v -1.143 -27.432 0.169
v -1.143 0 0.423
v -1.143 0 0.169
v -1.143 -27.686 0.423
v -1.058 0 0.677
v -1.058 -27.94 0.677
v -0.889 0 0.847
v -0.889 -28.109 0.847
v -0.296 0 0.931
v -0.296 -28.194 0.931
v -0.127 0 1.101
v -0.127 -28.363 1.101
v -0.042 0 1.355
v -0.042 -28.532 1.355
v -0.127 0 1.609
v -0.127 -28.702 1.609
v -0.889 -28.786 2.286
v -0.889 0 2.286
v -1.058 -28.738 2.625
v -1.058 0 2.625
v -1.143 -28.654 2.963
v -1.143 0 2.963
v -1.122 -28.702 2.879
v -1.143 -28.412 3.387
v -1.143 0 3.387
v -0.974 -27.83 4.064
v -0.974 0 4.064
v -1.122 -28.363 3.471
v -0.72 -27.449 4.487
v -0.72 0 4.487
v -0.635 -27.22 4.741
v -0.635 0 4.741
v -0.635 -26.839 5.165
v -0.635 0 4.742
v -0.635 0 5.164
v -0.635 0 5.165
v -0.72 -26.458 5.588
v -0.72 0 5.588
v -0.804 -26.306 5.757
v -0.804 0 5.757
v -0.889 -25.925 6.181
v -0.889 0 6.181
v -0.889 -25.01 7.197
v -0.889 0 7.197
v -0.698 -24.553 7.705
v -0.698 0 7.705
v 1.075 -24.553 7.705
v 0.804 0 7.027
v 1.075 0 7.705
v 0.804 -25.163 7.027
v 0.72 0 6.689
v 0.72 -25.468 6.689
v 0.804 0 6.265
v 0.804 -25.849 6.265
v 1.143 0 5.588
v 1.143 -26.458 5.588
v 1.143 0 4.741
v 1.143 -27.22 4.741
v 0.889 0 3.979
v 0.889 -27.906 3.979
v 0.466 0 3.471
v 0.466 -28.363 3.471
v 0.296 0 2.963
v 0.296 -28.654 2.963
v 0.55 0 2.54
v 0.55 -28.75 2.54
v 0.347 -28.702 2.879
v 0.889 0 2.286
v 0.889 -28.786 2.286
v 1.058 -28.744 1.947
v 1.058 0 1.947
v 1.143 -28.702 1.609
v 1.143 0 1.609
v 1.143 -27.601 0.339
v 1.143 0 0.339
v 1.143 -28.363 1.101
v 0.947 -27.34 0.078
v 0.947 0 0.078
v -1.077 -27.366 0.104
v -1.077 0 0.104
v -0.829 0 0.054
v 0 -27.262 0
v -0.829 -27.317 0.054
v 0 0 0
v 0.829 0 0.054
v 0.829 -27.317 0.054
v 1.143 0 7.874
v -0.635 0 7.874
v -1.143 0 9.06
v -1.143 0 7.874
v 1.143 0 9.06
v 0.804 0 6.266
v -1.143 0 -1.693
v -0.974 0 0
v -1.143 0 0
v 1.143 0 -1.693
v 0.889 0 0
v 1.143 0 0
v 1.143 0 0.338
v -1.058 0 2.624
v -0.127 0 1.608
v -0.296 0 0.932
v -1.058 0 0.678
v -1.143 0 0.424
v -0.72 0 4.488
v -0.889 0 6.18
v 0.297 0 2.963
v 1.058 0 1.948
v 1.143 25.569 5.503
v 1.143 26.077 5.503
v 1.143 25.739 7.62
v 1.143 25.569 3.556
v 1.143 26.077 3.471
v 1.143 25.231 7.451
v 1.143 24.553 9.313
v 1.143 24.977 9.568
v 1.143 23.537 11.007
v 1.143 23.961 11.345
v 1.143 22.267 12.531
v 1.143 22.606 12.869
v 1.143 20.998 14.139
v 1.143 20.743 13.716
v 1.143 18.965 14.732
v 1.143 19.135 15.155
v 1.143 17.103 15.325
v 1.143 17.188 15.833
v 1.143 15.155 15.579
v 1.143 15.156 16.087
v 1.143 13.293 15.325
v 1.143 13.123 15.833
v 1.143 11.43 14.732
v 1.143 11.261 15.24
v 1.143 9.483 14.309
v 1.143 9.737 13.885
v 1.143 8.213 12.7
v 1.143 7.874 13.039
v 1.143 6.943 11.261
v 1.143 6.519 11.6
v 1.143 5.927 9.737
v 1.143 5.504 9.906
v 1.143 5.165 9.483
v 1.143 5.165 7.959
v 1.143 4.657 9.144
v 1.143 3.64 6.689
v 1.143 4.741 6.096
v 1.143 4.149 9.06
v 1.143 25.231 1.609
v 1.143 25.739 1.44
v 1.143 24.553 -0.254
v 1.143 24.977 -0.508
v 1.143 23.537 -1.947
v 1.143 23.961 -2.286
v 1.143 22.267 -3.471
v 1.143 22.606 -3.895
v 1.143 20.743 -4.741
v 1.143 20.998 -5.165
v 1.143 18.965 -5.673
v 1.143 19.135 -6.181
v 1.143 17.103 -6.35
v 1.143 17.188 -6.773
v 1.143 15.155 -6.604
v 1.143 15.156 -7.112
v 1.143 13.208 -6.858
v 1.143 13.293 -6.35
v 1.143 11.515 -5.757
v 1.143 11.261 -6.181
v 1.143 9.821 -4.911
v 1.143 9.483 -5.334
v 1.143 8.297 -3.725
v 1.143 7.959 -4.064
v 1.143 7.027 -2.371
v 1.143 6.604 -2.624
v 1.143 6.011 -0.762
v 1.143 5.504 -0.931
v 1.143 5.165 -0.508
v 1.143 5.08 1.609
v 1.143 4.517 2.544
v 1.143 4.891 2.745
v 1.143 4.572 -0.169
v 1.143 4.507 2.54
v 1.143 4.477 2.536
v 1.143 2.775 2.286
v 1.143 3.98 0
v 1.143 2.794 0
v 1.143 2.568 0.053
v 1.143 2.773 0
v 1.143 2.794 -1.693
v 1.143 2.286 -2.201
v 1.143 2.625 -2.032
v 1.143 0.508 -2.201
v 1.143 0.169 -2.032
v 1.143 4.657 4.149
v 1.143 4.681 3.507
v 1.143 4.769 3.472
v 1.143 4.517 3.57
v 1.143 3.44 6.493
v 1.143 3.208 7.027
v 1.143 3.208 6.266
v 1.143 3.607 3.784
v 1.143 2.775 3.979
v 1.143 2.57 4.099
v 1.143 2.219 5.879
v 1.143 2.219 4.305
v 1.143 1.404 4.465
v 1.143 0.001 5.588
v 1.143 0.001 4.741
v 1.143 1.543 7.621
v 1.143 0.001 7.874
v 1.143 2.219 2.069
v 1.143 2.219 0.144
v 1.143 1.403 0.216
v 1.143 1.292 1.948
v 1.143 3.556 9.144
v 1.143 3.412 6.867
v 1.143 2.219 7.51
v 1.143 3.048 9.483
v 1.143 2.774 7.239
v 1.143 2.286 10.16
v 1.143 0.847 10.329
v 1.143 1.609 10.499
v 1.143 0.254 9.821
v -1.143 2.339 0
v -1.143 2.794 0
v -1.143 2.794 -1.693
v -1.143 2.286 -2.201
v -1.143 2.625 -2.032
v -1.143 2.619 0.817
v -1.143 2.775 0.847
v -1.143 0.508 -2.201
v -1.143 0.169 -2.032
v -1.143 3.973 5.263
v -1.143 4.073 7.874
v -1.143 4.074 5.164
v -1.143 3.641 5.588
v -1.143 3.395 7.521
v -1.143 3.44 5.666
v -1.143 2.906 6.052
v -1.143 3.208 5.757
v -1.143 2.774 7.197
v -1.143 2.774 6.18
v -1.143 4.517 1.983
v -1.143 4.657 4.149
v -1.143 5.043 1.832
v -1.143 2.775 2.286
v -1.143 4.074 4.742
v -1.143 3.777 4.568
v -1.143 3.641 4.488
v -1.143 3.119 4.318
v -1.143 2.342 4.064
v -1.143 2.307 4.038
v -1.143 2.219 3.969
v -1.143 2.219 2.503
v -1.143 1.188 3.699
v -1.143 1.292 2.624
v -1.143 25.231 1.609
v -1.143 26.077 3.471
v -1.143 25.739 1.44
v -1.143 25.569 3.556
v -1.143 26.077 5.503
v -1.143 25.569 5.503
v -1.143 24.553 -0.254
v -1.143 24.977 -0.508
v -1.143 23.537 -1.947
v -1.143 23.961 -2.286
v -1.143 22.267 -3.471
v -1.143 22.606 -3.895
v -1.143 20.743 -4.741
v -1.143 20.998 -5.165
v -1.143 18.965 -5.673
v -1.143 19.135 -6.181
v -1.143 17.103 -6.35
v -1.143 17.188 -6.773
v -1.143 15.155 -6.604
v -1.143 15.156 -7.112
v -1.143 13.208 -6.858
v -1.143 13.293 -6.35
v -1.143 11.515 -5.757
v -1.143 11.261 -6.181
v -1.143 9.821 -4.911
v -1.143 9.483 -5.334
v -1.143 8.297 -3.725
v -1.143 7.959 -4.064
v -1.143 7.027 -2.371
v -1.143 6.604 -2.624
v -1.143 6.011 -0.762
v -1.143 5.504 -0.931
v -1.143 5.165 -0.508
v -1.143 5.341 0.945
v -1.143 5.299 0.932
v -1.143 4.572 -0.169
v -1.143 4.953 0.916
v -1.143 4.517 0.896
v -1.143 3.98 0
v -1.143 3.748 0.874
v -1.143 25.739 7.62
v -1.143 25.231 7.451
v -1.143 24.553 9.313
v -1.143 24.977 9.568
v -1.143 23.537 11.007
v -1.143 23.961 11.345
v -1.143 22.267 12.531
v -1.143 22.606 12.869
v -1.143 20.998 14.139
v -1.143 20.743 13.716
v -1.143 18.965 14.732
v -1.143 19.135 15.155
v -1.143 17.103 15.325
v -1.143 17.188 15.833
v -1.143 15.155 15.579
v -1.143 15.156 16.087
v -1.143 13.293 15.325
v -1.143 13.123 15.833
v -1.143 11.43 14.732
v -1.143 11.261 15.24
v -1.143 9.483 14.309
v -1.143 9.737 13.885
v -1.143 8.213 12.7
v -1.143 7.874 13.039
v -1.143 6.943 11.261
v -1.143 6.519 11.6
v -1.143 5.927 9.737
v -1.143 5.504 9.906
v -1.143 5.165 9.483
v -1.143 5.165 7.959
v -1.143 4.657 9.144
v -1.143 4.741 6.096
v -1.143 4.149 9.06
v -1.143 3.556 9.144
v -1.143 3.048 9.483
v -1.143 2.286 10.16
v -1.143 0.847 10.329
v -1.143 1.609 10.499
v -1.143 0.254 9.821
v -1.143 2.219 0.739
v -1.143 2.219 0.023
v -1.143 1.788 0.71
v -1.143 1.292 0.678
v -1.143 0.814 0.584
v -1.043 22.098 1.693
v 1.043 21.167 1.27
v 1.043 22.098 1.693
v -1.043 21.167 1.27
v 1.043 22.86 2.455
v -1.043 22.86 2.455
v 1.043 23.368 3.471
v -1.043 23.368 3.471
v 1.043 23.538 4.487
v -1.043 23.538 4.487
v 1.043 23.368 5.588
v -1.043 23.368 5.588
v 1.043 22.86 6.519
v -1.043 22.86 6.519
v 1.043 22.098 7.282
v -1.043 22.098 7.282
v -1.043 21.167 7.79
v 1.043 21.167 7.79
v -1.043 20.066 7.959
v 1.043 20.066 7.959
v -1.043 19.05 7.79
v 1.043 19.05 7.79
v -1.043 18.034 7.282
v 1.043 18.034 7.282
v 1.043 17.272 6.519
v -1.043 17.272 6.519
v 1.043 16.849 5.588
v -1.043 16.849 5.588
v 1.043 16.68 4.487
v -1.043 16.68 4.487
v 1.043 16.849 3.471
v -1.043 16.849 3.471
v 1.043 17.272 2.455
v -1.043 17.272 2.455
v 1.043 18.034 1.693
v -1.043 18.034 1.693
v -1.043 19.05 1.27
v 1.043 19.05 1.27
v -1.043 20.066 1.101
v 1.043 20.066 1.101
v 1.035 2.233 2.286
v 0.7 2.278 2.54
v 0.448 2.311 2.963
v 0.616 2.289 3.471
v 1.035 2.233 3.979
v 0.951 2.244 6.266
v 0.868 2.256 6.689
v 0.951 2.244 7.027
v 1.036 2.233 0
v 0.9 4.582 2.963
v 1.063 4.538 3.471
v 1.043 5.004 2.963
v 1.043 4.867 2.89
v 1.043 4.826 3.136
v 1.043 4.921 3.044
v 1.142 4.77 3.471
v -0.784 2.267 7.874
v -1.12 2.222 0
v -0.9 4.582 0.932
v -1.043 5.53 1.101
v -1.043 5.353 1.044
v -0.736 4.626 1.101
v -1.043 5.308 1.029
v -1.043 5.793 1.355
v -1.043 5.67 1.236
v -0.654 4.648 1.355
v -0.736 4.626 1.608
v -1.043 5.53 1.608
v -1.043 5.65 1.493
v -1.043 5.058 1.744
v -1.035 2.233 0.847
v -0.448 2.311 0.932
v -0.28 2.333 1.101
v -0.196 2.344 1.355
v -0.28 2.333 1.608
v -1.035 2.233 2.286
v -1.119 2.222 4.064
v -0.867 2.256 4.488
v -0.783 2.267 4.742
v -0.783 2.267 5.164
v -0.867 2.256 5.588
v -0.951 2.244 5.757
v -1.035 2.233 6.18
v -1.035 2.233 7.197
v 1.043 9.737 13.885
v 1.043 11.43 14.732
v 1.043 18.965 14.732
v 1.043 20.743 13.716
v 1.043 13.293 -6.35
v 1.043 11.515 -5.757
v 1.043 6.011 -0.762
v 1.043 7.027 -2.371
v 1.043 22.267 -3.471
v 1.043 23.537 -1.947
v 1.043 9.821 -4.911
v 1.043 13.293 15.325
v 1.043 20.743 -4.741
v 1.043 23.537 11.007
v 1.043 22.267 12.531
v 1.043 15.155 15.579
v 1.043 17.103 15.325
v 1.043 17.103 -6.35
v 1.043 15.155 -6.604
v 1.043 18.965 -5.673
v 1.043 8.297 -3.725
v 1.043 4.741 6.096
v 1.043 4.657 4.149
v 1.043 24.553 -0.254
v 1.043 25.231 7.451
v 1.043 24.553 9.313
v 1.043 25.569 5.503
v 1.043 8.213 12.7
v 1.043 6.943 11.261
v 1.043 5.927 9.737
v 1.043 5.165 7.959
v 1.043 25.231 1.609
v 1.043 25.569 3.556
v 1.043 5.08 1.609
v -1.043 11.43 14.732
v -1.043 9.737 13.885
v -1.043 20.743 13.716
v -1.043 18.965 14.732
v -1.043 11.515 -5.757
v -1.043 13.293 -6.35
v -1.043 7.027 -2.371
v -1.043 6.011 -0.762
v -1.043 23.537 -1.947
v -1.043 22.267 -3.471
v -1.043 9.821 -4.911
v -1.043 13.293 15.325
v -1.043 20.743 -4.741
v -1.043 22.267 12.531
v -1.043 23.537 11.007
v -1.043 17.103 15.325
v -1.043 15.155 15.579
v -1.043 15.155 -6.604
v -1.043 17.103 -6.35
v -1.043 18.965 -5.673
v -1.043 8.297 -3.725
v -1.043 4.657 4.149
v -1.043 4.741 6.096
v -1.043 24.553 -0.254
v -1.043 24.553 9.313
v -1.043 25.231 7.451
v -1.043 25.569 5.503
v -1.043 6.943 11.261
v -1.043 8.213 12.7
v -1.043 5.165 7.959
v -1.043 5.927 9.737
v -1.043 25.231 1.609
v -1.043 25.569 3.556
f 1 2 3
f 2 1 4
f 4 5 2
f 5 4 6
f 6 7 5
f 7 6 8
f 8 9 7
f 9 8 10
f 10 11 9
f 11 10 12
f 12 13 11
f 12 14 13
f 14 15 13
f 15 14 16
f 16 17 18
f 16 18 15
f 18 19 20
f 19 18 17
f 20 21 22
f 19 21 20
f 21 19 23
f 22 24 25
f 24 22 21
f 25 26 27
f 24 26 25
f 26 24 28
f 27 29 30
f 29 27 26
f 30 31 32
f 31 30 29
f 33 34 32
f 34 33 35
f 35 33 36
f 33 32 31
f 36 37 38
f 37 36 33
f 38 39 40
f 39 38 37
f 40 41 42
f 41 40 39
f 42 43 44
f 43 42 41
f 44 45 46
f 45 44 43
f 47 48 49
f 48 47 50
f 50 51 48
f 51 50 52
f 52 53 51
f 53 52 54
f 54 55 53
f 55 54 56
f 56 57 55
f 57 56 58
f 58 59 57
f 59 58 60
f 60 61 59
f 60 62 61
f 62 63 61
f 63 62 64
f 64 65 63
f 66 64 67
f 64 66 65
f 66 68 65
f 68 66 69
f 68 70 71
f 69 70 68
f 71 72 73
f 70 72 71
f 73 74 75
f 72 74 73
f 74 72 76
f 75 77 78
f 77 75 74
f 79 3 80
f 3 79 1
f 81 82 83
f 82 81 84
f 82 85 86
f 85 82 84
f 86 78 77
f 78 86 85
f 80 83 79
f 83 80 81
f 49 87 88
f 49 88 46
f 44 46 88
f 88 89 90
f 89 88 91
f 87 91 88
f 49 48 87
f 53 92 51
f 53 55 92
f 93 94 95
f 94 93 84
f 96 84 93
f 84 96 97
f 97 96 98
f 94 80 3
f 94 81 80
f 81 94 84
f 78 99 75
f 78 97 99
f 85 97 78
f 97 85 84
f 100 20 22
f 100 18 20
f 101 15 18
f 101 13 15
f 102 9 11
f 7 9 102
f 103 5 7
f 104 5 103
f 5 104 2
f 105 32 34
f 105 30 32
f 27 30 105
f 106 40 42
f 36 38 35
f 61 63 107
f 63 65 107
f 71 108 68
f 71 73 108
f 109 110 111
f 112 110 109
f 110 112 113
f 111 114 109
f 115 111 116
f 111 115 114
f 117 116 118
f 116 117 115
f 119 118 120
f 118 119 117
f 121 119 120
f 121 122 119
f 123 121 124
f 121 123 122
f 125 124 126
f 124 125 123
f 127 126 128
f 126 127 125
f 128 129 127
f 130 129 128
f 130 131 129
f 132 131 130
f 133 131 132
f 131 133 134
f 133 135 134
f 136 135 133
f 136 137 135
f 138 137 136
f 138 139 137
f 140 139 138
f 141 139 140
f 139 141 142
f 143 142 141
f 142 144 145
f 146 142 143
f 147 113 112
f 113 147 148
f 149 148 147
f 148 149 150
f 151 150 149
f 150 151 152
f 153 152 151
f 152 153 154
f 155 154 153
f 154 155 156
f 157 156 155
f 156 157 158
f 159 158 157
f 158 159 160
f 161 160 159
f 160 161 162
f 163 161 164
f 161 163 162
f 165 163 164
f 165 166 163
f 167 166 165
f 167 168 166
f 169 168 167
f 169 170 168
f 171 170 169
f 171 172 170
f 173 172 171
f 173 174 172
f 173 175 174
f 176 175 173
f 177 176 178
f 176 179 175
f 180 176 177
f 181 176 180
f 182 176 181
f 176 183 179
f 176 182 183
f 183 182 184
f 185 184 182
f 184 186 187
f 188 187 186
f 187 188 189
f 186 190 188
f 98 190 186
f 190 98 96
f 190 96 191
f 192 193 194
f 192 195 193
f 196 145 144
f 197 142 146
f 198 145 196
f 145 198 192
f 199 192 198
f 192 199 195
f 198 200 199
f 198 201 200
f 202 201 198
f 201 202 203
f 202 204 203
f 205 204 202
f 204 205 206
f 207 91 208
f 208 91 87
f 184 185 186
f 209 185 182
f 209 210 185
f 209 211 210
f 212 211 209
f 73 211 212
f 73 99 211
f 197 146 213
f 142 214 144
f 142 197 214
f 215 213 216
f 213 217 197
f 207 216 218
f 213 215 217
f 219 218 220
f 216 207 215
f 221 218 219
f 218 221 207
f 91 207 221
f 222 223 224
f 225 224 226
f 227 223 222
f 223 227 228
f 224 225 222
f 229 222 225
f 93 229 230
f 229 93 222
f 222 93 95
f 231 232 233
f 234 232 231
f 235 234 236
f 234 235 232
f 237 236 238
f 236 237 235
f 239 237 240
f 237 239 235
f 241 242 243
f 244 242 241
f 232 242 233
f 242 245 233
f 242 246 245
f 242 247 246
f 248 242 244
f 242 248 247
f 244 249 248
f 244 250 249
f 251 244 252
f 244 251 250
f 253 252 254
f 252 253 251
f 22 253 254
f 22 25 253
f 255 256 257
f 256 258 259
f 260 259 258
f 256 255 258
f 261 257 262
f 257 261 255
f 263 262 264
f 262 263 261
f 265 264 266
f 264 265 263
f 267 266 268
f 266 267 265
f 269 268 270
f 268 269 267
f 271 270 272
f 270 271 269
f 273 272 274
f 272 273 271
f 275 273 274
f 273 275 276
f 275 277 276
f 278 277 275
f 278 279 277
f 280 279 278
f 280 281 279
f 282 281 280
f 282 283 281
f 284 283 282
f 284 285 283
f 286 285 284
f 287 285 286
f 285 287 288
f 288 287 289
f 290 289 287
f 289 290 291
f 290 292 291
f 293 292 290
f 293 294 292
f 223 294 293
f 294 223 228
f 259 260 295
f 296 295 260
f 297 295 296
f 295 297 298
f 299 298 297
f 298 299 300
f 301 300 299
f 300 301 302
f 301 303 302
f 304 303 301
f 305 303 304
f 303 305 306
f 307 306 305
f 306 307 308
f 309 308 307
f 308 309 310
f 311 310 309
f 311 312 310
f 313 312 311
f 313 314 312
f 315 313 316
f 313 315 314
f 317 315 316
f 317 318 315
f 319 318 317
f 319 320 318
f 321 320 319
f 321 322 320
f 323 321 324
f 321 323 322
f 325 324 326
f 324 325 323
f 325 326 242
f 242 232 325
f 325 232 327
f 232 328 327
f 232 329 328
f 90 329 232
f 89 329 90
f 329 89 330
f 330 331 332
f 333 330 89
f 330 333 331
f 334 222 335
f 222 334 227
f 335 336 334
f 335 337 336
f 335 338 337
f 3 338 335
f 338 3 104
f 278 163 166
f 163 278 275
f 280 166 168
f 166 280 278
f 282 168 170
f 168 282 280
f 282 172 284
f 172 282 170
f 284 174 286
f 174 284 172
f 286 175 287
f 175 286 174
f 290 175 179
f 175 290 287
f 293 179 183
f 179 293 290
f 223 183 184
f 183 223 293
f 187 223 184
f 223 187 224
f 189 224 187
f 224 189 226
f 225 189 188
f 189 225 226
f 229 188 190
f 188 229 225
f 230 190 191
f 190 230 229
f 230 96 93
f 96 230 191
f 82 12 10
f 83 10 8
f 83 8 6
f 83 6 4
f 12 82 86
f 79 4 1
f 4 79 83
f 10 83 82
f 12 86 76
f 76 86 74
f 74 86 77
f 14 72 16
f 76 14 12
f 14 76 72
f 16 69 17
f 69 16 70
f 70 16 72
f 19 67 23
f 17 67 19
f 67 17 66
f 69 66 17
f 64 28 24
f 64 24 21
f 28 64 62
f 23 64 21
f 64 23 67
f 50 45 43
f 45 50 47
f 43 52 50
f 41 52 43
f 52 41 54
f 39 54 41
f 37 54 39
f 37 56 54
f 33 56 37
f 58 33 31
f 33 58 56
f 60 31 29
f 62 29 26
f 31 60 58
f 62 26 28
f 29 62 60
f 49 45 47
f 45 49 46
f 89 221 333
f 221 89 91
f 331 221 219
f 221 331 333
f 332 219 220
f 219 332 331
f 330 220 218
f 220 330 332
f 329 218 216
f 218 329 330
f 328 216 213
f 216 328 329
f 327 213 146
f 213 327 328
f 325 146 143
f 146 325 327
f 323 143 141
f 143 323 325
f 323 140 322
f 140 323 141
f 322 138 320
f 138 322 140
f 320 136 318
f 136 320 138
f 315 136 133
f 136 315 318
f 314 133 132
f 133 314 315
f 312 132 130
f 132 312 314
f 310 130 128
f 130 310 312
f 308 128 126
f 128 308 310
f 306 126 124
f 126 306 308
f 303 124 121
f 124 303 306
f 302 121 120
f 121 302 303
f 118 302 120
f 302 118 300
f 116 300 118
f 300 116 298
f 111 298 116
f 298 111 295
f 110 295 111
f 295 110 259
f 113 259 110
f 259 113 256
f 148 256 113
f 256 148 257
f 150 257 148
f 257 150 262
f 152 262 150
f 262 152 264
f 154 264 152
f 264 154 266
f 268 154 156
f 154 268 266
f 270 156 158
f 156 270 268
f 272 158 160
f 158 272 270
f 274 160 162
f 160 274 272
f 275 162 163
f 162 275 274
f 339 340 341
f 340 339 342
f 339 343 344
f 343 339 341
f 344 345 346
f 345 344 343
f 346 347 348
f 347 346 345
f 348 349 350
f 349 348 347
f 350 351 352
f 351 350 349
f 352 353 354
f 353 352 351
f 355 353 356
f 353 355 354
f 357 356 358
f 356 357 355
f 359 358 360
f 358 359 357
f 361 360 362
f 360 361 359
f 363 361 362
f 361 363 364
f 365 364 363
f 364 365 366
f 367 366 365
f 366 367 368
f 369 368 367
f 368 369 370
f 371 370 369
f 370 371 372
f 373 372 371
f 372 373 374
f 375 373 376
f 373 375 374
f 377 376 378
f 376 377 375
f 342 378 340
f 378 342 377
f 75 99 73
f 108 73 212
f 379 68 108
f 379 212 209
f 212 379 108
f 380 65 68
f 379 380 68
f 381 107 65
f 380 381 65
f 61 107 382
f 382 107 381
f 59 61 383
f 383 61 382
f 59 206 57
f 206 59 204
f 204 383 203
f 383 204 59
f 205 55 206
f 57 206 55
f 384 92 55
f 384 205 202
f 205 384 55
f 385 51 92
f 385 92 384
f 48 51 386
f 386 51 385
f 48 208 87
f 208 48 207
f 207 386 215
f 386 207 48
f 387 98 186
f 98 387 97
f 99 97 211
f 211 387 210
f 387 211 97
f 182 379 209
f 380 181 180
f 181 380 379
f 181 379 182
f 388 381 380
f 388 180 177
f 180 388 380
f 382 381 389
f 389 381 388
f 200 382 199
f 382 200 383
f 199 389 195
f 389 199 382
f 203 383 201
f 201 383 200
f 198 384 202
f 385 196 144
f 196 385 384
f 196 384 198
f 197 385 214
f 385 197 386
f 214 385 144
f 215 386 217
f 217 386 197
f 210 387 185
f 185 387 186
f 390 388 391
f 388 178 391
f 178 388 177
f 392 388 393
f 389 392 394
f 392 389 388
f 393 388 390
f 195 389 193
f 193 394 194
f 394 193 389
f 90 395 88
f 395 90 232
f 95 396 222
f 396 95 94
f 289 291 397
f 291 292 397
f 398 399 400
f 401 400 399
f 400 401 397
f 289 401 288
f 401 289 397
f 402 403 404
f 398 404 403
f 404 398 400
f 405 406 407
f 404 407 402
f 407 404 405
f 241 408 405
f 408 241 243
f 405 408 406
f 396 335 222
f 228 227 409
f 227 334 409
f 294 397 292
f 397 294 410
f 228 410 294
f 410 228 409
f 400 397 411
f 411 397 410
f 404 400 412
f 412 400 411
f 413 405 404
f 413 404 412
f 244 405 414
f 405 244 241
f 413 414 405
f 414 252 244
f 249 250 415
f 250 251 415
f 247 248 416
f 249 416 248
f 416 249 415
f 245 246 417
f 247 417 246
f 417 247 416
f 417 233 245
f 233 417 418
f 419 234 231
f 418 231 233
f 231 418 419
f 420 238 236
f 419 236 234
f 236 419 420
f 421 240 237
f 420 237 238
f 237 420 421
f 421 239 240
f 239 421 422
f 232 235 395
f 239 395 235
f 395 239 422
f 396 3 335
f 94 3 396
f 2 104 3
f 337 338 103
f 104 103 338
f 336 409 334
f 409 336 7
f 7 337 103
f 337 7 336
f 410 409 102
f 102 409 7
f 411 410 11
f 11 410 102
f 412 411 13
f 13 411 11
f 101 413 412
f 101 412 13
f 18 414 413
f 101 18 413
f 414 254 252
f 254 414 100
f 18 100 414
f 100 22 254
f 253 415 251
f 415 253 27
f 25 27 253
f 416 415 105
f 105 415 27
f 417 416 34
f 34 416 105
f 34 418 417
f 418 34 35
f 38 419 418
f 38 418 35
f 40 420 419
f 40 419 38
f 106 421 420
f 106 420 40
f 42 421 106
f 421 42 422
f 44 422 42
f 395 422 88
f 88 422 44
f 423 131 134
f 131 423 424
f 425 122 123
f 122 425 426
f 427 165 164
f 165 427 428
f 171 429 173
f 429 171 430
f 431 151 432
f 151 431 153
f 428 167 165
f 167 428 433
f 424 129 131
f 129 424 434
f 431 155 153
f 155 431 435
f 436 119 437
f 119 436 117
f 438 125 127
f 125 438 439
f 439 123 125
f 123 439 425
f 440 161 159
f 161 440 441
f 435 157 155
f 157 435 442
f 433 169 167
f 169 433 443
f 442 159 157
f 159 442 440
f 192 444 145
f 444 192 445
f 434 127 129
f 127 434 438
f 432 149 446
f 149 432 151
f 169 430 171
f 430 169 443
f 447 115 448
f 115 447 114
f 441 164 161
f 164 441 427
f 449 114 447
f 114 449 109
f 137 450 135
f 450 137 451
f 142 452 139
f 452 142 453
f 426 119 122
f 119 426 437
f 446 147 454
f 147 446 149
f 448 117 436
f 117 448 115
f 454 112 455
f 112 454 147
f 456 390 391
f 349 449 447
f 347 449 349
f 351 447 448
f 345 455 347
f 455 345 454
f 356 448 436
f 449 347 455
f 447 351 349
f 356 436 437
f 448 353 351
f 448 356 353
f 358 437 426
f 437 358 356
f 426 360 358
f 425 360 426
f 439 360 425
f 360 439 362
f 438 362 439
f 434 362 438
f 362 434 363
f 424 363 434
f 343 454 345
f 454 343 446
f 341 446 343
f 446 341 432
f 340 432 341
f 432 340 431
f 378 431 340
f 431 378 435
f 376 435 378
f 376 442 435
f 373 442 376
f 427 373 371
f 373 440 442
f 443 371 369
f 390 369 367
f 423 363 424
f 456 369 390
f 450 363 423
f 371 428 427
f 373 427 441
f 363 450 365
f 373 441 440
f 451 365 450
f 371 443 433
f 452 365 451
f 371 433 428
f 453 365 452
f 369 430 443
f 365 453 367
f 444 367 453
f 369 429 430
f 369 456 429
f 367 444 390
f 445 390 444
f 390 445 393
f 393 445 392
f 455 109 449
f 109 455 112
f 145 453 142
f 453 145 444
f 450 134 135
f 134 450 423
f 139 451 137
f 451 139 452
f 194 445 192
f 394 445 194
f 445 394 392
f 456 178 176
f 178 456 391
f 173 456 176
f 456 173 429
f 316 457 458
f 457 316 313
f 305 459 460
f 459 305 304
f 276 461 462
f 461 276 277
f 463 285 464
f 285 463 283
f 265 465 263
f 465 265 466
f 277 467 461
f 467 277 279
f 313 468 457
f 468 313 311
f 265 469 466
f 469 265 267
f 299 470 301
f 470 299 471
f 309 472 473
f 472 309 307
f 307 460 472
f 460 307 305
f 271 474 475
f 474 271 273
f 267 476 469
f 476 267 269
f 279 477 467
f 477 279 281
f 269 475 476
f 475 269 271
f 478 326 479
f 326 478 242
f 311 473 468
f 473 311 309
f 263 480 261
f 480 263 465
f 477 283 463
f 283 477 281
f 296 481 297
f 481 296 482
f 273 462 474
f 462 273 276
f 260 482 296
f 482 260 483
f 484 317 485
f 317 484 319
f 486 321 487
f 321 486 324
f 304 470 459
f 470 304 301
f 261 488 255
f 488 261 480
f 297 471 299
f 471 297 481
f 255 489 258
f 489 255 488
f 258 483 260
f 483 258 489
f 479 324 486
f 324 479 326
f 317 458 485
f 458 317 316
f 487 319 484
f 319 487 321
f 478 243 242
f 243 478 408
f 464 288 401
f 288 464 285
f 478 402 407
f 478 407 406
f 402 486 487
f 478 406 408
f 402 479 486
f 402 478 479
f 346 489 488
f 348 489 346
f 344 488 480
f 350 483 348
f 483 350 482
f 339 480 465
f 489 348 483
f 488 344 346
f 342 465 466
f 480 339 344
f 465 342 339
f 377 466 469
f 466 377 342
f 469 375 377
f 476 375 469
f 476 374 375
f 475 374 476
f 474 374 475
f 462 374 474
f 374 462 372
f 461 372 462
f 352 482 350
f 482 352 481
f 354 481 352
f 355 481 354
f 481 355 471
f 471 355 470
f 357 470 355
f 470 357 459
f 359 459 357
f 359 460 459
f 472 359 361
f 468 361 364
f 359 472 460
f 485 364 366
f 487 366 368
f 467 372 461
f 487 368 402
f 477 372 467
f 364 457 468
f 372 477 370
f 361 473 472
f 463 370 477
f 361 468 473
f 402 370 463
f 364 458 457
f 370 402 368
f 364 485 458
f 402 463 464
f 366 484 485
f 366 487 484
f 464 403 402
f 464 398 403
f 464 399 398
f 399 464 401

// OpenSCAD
use <keygen.scad>
include <medeco.scad>

module medeco_classic(bitting="",
                      outline_name="1515",
                      warding_name="1515") {

    name = "Medeco Classic";

    /*
        "A" variants of key outlines indicates 6-pin version.

        Bitting is specified from bow to tip, 1-6, with 1 being the shallowest cut and 6 being the deepest.

        After each number, a letter L, C, or R is specified for the cut angle: left, center or right.

        Example: 2L5C3C6R3R
    */

    outlines_k = ["A1515",
                  "1515",
                  "A1517",
                  "1517",
                  "1518",
                  "1542",
                  "1543",
                  "A1638",
                  "1638",
                  "1644",
                  "1655"];

    wardings_k = ["1515",
                  "1517",
                  "1518",
                  "1542",
                  "1543",
                  "1638",
                  "1644",
                  "1655"];

    outline_param = key_lkup(outlines_k, outlines_v, outline_name);
    outline_points = outline_param[0];
    outline_paths = outline_param[1];
    offset = outline_param[2];
    engrave_points = outline_param[3];
    engrave_paths = outline_param[4];

    warding_points = key_lkup(wardings_k, wardings_v, warding_name);
    
    cut_locations = [for(i=[0.244, 0.414, 0.584, 0.754, 0.924, 1.094]) i*25.4];
    depth_table = [for(i=[0.266+0.030:-0.030:0.115]) i*25.4];
    angles_k = ["L", "C", "R"];
    angles_v = [20, 0, -20];

    bitting_depth = [for(i=[0:2:len(bitting)-1]) bitting[i]];
    bitting_angle = [for(i=[1:2:len(bitting)-1]) bitting[i]];
    heights = key_code_to_heights(bitting_depth, depth_table);
    angles = [for(c=bitting_angle) key_lkup(angles_k, angles_v, c)];

    difference() {
        if($children == 0) {
            key_blank(outline_points,
                      warding_points,
                      outline_paths=outline_paths,
                      engrave_right_points=engrave_points,
                      engrave_right_paths=engrave_paths,
                      engrave_left_points=engrave_points,
                      engrave_left_paths=engrave_paths,
                      offset=offset,
                      plug_diameter=12.7);
        } else {
            children(0);
        }
        key_bitting(heights, cut_locations,
                    flat=.381, angle=86, // from CW-1012 cutter specs
                    angles=angles);
    }
}

// Defaults
bitting="";
outline="1515";
warding="1515";
medeco_classic(bitting, outline, warding);
